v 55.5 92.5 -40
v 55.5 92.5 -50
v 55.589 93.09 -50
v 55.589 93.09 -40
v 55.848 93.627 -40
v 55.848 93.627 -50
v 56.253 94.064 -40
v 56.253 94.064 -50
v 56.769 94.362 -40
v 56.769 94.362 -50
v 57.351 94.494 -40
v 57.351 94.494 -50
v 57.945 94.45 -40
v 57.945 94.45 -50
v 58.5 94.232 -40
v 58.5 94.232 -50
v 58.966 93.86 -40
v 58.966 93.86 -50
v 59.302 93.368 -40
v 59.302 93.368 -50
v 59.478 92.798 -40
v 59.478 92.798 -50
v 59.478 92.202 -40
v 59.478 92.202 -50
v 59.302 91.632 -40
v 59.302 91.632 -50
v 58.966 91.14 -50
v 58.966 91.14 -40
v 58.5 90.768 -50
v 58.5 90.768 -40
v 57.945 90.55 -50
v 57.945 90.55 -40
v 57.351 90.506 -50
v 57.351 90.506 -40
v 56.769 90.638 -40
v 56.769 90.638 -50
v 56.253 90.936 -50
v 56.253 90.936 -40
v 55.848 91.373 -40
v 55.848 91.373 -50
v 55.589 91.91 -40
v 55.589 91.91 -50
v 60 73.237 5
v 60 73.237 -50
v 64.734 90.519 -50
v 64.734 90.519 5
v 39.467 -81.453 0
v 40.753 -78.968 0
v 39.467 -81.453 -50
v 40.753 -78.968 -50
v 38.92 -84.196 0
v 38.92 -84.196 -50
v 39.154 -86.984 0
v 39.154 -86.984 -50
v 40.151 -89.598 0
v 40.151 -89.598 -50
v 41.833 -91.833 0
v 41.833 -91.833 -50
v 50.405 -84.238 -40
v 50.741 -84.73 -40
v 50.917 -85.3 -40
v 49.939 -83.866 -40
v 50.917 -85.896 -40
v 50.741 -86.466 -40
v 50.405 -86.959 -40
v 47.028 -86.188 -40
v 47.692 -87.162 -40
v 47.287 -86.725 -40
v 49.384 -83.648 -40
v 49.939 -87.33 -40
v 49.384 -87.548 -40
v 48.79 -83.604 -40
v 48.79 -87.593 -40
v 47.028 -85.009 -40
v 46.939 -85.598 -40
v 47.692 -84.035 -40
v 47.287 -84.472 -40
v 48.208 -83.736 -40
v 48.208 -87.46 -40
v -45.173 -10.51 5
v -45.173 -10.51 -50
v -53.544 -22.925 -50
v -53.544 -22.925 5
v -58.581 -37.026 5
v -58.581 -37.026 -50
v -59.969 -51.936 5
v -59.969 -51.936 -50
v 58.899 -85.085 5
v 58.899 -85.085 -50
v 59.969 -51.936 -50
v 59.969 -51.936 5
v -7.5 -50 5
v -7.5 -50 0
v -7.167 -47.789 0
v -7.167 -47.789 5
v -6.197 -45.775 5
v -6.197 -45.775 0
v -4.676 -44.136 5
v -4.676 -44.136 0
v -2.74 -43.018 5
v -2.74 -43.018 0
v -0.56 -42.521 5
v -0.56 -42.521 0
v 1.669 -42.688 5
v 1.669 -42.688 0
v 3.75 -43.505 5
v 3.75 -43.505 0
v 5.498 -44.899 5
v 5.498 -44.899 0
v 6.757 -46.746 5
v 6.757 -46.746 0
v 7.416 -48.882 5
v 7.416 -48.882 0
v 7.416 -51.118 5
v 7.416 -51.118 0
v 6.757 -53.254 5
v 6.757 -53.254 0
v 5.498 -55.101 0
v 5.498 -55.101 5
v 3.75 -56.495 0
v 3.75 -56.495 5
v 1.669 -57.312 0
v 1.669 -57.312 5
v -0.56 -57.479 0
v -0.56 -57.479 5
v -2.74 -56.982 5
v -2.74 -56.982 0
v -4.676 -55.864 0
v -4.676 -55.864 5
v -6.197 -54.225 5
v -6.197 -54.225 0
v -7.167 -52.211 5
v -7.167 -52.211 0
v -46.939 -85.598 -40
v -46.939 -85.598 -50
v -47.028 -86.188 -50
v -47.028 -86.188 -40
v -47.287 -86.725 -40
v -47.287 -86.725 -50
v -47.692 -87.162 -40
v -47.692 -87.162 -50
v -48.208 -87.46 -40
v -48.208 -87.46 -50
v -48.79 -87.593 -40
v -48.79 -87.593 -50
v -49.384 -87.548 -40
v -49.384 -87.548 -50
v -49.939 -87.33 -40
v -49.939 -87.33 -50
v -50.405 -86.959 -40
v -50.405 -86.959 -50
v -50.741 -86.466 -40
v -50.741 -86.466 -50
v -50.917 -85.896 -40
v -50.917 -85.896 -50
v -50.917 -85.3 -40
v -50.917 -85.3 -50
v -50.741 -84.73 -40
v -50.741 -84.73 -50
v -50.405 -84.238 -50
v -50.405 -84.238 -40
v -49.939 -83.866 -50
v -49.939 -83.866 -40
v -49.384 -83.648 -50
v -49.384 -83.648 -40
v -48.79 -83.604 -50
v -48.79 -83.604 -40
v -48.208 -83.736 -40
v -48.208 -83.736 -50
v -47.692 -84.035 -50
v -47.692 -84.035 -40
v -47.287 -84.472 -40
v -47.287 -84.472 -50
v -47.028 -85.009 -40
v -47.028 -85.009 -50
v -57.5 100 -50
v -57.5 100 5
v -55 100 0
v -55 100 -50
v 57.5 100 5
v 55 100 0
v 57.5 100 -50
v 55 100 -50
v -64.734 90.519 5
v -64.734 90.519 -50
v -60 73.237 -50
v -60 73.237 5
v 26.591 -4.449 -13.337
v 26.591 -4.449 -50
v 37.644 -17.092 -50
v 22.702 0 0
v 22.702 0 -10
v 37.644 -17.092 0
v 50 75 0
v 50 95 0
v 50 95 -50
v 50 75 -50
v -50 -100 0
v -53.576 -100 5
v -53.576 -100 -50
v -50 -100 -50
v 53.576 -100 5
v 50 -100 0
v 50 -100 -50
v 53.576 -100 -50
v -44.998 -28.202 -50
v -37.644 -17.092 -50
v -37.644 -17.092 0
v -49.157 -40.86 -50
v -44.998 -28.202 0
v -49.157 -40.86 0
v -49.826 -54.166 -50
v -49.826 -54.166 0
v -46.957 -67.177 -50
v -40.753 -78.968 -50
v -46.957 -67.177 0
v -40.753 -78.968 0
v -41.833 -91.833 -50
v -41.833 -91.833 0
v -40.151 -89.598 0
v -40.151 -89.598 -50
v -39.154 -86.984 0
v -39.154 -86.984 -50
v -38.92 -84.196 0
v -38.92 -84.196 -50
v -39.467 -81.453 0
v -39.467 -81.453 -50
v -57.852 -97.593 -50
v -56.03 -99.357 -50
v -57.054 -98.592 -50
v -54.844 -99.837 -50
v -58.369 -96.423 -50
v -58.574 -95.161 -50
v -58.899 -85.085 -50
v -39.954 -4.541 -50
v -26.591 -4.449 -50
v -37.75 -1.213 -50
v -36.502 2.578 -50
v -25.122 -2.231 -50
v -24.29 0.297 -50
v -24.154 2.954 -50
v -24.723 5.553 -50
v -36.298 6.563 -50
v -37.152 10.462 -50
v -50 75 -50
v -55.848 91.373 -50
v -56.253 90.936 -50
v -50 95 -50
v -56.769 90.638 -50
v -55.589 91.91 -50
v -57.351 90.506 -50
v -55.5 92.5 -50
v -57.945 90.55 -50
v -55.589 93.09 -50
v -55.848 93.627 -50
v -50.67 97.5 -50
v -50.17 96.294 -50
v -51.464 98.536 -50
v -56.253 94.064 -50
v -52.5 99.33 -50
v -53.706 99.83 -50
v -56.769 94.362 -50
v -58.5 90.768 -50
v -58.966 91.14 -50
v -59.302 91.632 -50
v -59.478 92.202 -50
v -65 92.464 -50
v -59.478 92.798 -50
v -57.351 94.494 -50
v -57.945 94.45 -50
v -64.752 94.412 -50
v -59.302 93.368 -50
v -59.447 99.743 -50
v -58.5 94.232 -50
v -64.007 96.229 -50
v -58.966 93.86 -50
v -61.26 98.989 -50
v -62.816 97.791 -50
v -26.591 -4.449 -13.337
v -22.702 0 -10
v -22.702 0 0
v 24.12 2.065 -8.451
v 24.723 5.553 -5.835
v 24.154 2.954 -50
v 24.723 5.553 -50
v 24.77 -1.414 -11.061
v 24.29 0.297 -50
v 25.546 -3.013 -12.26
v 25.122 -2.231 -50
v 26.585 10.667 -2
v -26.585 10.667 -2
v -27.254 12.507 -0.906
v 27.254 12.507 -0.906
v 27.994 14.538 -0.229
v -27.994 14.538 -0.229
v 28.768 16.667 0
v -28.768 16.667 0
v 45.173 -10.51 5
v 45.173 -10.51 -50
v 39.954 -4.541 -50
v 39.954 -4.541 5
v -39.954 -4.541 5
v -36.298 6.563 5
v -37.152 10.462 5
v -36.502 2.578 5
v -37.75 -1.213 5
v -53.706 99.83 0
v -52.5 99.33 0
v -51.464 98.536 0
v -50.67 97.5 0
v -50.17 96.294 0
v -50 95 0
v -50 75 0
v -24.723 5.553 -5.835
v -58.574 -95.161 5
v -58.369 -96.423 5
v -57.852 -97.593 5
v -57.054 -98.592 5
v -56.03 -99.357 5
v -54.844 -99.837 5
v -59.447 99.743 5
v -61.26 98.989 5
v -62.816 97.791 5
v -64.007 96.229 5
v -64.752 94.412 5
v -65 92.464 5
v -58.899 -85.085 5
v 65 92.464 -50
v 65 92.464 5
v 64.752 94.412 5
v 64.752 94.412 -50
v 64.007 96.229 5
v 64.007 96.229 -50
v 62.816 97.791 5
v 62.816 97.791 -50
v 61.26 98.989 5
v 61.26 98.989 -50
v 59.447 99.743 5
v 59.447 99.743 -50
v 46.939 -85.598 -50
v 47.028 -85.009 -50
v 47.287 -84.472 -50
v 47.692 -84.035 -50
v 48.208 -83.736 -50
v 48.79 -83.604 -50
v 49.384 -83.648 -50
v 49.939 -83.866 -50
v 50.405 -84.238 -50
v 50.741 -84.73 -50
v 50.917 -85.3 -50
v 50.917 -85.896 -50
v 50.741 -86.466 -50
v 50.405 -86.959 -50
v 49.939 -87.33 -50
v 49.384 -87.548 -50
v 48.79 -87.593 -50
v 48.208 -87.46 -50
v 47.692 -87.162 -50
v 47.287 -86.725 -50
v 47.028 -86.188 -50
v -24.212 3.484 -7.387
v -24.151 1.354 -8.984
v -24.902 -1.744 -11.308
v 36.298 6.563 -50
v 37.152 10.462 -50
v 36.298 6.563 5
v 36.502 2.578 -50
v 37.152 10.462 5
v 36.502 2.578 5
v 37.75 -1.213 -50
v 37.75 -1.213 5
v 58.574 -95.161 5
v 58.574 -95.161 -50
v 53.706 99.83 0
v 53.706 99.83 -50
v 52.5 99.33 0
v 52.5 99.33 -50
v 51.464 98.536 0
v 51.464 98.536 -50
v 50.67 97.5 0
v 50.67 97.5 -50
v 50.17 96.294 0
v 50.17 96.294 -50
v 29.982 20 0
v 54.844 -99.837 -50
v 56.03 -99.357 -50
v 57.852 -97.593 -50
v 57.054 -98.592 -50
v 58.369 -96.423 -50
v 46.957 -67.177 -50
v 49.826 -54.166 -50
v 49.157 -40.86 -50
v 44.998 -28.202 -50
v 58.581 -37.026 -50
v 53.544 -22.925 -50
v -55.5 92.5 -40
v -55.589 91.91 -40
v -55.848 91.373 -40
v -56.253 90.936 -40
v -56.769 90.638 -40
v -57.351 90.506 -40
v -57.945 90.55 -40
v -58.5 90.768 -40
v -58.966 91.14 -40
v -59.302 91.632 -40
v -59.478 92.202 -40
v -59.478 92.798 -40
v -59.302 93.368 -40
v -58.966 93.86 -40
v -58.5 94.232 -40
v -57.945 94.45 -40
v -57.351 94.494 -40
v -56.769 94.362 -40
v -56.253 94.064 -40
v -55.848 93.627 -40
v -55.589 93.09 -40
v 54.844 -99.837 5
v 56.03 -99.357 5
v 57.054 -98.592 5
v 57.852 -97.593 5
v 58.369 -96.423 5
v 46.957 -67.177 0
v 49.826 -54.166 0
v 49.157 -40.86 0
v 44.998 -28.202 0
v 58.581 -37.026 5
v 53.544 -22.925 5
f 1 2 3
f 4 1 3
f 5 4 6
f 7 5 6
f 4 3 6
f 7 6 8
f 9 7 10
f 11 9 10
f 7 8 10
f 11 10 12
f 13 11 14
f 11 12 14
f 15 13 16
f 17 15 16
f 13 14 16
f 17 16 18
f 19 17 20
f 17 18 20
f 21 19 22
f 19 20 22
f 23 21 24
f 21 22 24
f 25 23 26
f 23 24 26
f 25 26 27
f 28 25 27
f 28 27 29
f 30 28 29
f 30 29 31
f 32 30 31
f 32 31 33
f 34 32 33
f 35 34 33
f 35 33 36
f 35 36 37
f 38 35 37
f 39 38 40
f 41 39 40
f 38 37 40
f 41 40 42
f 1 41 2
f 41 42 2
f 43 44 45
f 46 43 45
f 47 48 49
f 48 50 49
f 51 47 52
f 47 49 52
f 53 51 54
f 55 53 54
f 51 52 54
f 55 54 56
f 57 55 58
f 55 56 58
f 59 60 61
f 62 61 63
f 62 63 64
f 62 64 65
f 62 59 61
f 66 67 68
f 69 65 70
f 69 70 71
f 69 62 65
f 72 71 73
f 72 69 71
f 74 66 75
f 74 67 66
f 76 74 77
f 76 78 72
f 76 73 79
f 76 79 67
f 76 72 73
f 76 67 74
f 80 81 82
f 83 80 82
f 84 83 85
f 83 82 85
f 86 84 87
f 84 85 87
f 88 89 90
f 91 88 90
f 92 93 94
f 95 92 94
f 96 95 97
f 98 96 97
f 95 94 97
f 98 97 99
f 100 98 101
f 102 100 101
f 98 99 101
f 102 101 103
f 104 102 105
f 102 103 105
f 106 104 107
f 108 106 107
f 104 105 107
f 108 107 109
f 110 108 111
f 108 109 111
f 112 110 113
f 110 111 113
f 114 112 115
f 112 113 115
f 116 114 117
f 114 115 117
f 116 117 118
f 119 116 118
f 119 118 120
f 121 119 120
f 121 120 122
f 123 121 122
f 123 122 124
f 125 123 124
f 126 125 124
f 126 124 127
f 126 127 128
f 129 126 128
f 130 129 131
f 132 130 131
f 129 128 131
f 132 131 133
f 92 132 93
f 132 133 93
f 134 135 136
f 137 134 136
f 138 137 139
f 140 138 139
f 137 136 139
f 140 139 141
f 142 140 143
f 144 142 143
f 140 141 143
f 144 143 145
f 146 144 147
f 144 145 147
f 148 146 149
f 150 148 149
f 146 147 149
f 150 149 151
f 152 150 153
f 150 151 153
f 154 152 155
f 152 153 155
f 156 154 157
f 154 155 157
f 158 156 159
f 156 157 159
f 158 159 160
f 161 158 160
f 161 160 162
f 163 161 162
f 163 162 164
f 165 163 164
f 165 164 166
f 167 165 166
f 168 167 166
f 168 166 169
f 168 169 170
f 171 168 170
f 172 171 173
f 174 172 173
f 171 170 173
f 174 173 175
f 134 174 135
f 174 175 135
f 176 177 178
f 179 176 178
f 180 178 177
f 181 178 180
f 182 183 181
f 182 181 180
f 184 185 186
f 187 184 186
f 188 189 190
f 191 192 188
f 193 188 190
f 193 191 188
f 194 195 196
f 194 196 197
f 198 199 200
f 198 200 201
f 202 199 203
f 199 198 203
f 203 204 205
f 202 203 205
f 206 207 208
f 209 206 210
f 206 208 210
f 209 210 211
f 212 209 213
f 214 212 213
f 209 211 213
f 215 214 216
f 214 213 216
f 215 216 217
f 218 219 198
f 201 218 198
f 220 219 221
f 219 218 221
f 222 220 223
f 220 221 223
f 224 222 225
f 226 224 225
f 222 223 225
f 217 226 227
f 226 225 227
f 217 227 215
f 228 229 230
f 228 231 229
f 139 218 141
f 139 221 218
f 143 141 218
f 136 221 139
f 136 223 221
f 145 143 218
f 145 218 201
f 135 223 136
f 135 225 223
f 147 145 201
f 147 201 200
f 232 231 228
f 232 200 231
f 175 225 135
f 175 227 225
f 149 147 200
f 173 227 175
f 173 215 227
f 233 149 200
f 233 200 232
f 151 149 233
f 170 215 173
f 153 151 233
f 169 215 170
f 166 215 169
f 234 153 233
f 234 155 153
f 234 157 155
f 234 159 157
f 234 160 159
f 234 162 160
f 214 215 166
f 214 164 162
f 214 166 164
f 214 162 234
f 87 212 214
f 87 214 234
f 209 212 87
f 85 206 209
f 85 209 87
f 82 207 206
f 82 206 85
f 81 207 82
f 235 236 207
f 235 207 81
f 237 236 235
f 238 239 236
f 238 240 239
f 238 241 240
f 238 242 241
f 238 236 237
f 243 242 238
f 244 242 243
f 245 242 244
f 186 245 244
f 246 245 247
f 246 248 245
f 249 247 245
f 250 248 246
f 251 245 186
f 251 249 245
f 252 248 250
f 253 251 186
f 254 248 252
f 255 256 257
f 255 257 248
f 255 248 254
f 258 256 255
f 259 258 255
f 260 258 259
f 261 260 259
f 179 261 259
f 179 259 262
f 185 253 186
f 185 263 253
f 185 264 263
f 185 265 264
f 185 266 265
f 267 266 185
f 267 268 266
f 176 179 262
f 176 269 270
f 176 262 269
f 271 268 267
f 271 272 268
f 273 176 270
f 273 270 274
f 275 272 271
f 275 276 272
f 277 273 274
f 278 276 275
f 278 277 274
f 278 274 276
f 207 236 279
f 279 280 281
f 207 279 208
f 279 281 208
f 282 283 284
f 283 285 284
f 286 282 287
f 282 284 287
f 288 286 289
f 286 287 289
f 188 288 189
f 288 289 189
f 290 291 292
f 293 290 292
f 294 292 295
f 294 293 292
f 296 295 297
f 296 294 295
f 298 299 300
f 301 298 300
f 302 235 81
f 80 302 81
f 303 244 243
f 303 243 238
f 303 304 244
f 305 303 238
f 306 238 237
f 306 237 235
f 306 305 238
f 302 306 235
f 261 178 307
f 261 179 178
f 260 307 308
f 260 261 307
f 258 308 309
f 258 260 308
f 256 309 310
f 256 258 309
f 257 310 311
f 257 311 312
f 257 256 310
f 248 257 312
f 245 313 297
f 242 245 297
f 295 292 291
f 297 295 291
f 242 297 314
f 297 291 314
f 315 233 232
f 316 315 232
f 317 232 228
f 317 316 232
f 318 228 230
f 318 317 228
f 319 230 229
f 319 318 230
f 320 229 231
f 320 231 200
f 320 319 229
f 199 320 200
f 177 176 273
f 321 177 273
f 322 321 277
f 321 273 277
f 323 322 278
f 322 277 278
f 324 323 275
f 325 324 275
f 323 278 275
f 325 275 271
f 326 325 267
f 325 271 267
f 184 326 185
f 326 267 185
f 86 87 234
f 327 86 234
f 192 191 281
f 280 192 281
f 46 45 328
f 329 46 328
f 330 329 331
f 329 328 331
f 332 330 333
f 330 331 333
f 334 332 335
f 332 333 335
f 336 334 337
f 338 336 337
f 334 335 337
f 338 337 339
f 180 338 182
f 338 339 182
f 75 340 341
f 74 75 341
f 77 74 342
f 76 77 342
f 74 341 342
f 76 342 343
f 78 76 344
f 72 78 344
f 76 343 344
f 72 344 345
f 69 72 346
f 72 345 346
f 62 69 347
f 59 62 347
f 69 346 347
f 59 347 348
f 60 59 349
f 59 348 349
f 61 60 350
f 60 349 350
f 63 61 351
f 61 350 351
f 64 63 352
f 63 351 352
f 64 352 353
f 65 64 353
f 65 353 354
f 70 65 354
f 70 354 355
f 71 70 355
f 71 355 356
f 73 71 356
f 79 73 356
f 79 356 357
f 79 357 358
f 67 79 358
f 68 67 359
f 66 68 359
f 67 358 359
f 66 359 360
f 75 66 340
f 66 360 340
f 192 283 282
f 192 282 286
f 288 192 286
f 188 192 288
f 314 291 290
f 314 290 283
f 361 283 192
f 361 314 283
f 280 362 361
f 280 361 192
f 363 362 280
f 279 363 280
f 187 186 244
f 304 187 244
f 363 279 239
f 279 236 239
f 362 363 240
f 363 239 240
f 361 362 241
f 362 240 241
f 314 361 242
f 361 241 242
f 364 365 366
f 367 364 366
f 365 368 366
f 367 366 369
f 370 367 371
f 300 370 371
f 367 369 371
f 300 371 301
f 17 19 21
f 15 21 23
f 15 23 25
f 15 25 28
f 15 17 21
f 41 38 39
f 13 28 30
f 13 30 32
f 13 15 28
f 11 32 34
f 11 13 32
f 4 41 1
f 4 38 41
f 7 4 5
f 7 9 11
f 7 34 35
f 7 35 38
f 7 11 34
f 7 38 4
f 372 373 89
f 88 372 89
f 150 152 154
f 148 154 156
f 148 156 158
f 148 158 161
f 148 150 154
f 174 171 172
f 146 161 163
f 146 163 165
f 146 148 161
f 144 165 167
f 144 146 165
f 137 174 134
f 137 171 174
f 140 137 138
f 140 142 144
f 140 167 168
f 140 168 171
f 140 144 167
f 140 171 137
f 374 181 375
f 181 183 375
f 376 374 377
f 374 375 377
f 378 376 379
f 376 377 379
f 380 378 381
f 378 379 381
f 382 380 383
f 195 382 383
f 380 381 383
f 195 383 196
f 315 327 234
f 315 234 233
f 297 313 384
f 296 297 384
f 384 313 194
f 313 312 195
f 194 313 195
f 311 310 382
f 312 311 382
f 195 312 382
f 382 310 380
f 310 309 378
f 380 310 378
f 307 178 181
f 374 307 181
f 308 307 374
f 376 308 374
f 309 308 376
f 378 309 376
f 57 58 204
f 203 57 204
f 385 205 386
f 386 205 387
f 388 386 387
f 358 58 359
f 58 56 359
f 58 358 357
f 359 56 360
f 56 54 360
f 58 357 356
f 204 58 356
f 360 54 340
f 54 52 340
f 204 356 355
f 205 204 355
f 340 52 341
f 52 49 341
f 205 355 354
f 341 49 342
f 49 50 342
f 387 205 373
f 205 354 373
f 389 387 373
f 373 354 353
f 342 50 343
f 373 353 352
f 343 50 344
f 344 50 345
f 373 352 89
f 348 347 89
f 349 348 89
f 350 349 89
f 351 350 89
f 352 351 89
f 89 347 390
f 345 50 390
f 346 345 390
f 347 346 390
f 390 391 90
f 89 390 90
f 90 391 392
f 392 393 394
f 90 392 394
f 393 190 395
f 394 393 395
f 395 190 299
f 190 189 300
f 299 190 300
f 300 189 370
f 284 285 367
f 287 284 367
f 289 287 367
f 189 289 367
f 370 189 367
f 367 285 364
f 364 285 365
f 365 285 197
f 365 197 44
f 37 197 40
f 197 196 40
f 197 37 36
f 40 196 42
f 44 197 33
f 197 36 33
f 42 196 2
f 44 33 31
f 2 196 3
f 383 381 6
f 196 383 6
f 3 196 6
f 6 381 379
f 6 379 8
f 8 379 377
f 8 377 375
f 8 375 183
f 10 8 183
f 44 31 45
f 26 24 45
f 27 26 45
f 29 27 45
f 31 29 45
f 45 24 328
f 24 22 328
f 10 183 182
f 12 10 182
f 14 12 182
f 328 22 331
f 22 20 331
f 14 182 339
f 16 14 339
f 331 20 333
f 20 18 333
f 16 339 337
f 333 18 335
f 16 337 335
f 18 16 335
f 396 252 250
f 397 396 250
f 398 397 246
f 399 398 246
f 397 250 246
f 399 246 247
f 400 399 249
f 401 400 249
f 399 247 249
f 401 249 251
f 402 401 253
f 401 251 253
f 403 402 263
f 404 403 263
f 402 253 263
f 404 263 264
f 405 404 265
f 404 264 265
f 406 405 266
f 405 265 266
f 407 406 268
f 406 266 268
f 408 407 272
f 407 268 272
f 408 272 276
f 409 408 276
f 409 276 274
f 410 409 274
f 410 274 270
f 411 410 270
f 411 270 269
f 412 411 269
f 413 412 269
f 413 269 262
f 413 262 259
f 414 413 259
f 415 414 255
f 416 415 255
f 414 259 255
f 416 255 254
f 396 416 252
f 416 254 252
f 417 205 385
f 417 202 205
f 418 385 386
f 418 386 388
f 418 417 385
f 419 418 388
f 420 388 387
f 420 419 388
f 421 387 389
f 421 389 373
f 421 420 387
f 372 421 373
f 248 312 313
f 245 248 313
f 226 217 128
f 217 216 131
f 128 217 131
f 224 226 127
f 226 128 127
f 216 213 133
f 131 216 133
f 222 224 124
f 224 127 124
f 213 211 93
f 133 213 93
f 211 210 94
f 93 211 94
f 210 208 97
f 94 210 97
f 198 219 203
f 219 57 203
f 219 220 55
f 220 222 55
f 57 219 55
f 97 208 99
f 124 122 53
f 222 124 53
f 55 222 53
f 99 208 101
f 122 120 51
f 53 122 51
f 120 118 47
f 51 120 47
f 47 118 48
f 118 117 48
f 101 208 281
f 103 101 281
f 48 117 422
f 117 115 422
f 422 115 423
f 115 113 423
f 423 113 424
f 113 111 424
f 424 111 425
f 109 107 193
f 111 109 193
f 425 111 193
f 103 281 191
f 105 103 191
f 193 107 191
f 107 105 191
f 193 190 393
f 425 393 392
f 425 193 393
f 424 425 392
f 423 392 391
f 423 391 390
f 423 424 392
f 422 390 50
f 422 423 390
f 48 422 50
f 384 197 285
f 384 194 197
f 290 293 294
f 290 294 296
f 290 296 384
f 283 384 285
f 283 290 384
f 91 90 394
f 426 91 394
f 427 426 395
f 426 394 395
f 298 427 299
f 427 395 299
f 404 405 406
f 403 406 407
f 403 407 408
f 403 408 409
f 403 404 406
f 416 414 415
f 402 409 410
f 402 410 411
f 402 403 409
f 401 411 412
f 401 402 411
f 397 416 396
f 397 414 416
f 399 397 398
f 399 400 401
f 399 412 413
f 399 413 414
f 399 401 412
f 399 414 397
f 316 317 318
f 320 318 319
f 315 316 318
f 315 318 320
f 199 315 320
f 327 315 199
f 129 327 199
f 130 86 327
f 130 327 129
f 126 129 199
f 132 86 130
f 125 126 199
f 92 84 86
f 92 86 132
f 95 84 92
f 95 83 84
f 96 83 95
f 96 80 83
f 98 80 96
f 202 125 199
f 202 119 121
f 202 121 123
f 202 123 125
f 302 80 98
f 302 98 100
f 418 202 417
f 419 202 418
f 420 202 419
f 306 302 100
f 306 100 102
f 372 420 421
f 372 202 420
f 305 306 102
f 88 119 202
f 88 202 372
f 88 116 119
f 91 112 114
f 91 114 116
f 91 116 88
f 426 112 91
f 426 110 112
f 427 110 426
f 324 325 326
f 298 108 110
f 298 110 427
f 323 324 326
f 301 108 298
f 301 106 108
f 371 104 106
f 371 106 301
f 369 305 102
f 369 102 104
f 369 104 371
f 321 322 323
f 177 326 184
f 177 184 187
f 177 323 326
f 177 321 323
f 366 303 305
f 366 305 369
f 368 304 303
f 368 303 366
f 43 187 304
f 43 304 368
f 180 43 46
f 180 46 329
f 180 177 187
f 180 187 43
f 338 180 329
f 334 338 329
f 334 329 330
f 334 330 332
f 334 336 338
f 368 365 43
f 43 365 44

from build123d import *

# Parameters (mm, degrees)
BOSS_EXTRUDE1_DEPTH   = 50
BOSS_EXTRUDE1_2_DEPTH = 50
BOSS_EXTRUDE2_DEPTH   = 10
CHAMFER1_SIZE         = 15
CHAMFER1_SIZE_2       = 20
SKETCH4_W             = 160
SKETCH4_H             = 200
BOSS_EXTRUDE3_DEPTH   = 5
FILLET1_R             = 10
SKETCH5_R             = 7.5
CUT_EXTRUDE1_DEPTH    = 5
CUT_EXTRUDE3_DEPTH    = 55
FILLET3_R             = 15
FILLET4_R             = 5
SKETCH9_R             = 2
CUT_EXTRUDE4_DEPTH    = 10
FILLET6_R             = 5


with BuildPart() as part:
    # Sketch2 → Boss-Extrude1 (new body)
    with BuildSketch(Plane.XY):
        with BuildLine():
            Line((-50, 75), (-22.70223243, 0))
            Line((-22.70223243, 0), (-37.64392369, -17.092022104))
            ThreePointArc((-37.64392369, -17.092022104), (-49.971924127, -51.675350432), (-35.355339059, -85.355339059))
            Line((-35.355339059, -85.355339059), (-50, -100))
            Line((-50, -100), (-80, -100))
            Line((-80, -100), (-80, 100))
            Line((-80, 100), (-50, 100))
            Line((-50, 100), (-50, 75))
        make_face()
    extrude(amount=-BOSS_EXTRUDE1_DEPTH)



with BuildPart() as body_2:
    # Sketch2 → Boss-Extrude1 2 (new body)
    with BuildSketch(Plane.XY):
        with BuildLine():
            Line((50, 75), (22.70223243, 0))
            Line((22.70223243, 0), (37.64392369, -17.092022104))
            ThreePointArc((37.64392369, -17.092022104), (49.971924127, -51.675350432), (35.355339059, -85.355339059))
            Line((35.355339059, -85.355339059), (50, -100))
            Line((50, -100), (80, -100))
            Line((80, -100), (80, 100))
            Line((80, 100), (50, 100))
            Line((50, 100), (50, 75))
        make_face()
    extrude(amount=-BOSS_EXTRUDE1_2_DEPTH)


with BuildPart() as part_1:
    add(part.part)

    add(body_2.part)  # Boss-Extrude2 merges body 2
    # Sketch3 → Boss-Extrude2 (add)
    with BuildSketch(Plane.XY):
        Polygon((-29.981637115, 20), (29.981637115, 20), (22.70223243, 0), (-22.70223243, 0), align=None)
    extrude(amount=-BOSS_EXTRUDE2_DEPTH)

    # Chamfer1
    # the kernel refuses this chamfer: 20, 15 mm, written as the material it takes off along each edge
    with BuildSketch(Plane(origin=(-81.595588718, 20, -10), x_dir=(0, 0.041308380137954244, 0.9991464445867674), z_dir=(1, 0, 0))) as chamfer1_piece_1_section:
        Polygon((CHAMFER1_SIZE * 0.999146444587, CHAMFER1_SIZE * 0.041308380138), (-CHAMFER1_SIZE_2 * 0.041308380138, CHAMFER1_SIZE_2 * 0.999146444587), (0, 0), align=None)
    chamfer1_piece_1 = extrude(amount=163.191177435, mode=Mode.PRIVATE)
    chamfer1_piece_1 = split(chamfer1_piece_1, bisect_by=Plane(origin=(-24.447399798, 4.794807938, -4.975922198), z_dir=(0.9396926207859094, 0.3420201433256661, 0)), keep=Keep.TOP, mode=Mode.PRIVATE)
    chamfer1_piece_1 = split(chamfer1_piece_1, bisect_by=Plane(origin=(24.447399798, 4.794807938, -4.975922198), z_dir=(-0.939692620785907, 0.34202014332567265, 0)), keep=Keep.TOP, mode=Mode.PRIVATE)
    add(chamfer1_piece_1, mode=Mode.SUBTRACT)

    # Sketch4 → Boss-Extrude3 (add)
    with BuildSketch(Plane.XY):
        Rectangle(SKETCH4_W, SKETCH4_H)
    extrude(amount=BOSS_EXTRUDE3_DEPTH)

    # Fillet1
    fillet1_edges = [part_1.edges().sort_by_distance(p)[0] for p in [
        (0, 13.333333333, 0),
        (-22.70223243, 0, -30),
        (-35.355339059, -85.355339059, -25),
        (35.355339059, -85.355339059, -25),
        (22.70223243, 0, -30),
    ]]
    fillet(fillet1_edges, radius=FILLET1_R)

    # Sketch5 → Cut-Extrude1 (cut)
    with BuildSketch(Plane(origin=(0, 0, 0), x_dir=(-1, 0, 0), z_dir=(0, 0, -1))):
        with Locations((0, -50)):
            Circle(SKETCH5_R)
    extrude(amount=-CUT_EXTRUDE1_DEPTH, mode=Mode.SUBTRACT)

    # Sketch8 → Cut-Extrude3 (cut)
    with BuildSketch(Plane(origin=(0, 0, -50), x_dir=(-1, 0, 0), z_dir=(0, 0, -1))):
        with BuildLine():
            Line((-60, 100), (-80, 100))
            Line((-80, 100), (-80, -100))
            Line((-80, -100), (-58.41745651, -100))
            Line((-58.41745651, -100), (-58.898864587, -85.084522946))
            Line((-58.898864587, -85.084522946), (-59.968772691, -51.935536587))
            ThreePointArc((-59.968772691, -51.935536587), (-56.503917554, -29.818144261), (-45.172708428, -10.510426525))
            Line((-45.172708428, -10.510426525), (-34.120235365, 2.132661237))
            Line((-34.120235365, 2.132661237), (-60, 73.236730193))
            Line((-60, 73.236730193), (-64.733567494, 90.51871221))
            ThreePointArc((-64.733567494, 90.51871221), (-63.462787034, 97.049194521), (-57.5, 100))
            Line((-57.5, 100), (-60, 100))
        make_face()
        with BuildLine():
            Line((34.120235365, 2.132661237), (45.172708428, -10.510426525))
            ThreePointArc((45.172708428, -10.510426525), (56.503917554, -29.818144261), (59.968772691, -51.935536587))
            Line((59.968772691, -51.935536587), (58.898864587, -85.084522946))
            Line((58.898864587, -85.084522946), (58.41745651, -100))
            Line((58.41745651, -100), (80, -100))
            Line((80, -100), (80, 100))
            Line((80, 100), (60, 100))
            Line((60, 100), (57.5, 100))
            ThreePointArc((57.5, 100), (63.462787034, 97.049194521), (64.733567494, 90.51871221))
            Line((64.733567494, 90.51871221), (60, 73.236730193))
            Line((60, 73.236730193), (34.120235365, 2.132661237))
        make_face()
    extrude(amount=-CUT_EXTRUDE3_DEPTH, mode=Mode.SUBTRACT)

    # Fillet3
    fillet3_edges = [part_1.edges().sort_by_distance(p)[0] for p in [
        (34.120235365, 2.132661237, -22.5),
        (-34.120235365, 2.132661237, -22.5),
    ]]
    fillet(fillet3_edges, radius=FILLET3_R)

    # Fillet4
    fillet4_edges = [part_1.edges().sort_by_distance(p)[0] for p in [
        (-50, 100, -25),
        (50, 100, -25),
    ]]
    fillet(fillet4_edges, radius=FILLET4_R)

    # Sketch9 → Cut-Extrude4 (cut)
    with BuildSketch(Plane(origin=(0, 0, -50), x_dir=(-1, 0, 0), z_dir=(0, 0, -1))):
        with Locations((-57.5, 92.5)):
            Circle(SKETCH9_R)
        with Locations((-48.939097244, -85.598196118)):
            Circle(SKETCH9_R)
        with Locations(Location((48.939097244, -85.598196118, 0), (0, 0, 180))):
            Circle(SKETCH9_R)
        with Locations(Location((57.5, 92.5, 0), (0, 0, 180))):
            Circle(SKETCH9_R)
    extrude(amount=-CUT_EXTRUDE4_DEPTH, mode=Mode.SUBTRACT)

    # Fillet6
    fillet6_edges = [part_1.edges().sort_by_distance(p)[0] for p in [
        (58.41745651, -100, -22.5),
        (-58.41745651, -100, -22.5),
    ]]
    fillet(fillet6_edges, radius=FILLET6_R)


solid = part_1.part
